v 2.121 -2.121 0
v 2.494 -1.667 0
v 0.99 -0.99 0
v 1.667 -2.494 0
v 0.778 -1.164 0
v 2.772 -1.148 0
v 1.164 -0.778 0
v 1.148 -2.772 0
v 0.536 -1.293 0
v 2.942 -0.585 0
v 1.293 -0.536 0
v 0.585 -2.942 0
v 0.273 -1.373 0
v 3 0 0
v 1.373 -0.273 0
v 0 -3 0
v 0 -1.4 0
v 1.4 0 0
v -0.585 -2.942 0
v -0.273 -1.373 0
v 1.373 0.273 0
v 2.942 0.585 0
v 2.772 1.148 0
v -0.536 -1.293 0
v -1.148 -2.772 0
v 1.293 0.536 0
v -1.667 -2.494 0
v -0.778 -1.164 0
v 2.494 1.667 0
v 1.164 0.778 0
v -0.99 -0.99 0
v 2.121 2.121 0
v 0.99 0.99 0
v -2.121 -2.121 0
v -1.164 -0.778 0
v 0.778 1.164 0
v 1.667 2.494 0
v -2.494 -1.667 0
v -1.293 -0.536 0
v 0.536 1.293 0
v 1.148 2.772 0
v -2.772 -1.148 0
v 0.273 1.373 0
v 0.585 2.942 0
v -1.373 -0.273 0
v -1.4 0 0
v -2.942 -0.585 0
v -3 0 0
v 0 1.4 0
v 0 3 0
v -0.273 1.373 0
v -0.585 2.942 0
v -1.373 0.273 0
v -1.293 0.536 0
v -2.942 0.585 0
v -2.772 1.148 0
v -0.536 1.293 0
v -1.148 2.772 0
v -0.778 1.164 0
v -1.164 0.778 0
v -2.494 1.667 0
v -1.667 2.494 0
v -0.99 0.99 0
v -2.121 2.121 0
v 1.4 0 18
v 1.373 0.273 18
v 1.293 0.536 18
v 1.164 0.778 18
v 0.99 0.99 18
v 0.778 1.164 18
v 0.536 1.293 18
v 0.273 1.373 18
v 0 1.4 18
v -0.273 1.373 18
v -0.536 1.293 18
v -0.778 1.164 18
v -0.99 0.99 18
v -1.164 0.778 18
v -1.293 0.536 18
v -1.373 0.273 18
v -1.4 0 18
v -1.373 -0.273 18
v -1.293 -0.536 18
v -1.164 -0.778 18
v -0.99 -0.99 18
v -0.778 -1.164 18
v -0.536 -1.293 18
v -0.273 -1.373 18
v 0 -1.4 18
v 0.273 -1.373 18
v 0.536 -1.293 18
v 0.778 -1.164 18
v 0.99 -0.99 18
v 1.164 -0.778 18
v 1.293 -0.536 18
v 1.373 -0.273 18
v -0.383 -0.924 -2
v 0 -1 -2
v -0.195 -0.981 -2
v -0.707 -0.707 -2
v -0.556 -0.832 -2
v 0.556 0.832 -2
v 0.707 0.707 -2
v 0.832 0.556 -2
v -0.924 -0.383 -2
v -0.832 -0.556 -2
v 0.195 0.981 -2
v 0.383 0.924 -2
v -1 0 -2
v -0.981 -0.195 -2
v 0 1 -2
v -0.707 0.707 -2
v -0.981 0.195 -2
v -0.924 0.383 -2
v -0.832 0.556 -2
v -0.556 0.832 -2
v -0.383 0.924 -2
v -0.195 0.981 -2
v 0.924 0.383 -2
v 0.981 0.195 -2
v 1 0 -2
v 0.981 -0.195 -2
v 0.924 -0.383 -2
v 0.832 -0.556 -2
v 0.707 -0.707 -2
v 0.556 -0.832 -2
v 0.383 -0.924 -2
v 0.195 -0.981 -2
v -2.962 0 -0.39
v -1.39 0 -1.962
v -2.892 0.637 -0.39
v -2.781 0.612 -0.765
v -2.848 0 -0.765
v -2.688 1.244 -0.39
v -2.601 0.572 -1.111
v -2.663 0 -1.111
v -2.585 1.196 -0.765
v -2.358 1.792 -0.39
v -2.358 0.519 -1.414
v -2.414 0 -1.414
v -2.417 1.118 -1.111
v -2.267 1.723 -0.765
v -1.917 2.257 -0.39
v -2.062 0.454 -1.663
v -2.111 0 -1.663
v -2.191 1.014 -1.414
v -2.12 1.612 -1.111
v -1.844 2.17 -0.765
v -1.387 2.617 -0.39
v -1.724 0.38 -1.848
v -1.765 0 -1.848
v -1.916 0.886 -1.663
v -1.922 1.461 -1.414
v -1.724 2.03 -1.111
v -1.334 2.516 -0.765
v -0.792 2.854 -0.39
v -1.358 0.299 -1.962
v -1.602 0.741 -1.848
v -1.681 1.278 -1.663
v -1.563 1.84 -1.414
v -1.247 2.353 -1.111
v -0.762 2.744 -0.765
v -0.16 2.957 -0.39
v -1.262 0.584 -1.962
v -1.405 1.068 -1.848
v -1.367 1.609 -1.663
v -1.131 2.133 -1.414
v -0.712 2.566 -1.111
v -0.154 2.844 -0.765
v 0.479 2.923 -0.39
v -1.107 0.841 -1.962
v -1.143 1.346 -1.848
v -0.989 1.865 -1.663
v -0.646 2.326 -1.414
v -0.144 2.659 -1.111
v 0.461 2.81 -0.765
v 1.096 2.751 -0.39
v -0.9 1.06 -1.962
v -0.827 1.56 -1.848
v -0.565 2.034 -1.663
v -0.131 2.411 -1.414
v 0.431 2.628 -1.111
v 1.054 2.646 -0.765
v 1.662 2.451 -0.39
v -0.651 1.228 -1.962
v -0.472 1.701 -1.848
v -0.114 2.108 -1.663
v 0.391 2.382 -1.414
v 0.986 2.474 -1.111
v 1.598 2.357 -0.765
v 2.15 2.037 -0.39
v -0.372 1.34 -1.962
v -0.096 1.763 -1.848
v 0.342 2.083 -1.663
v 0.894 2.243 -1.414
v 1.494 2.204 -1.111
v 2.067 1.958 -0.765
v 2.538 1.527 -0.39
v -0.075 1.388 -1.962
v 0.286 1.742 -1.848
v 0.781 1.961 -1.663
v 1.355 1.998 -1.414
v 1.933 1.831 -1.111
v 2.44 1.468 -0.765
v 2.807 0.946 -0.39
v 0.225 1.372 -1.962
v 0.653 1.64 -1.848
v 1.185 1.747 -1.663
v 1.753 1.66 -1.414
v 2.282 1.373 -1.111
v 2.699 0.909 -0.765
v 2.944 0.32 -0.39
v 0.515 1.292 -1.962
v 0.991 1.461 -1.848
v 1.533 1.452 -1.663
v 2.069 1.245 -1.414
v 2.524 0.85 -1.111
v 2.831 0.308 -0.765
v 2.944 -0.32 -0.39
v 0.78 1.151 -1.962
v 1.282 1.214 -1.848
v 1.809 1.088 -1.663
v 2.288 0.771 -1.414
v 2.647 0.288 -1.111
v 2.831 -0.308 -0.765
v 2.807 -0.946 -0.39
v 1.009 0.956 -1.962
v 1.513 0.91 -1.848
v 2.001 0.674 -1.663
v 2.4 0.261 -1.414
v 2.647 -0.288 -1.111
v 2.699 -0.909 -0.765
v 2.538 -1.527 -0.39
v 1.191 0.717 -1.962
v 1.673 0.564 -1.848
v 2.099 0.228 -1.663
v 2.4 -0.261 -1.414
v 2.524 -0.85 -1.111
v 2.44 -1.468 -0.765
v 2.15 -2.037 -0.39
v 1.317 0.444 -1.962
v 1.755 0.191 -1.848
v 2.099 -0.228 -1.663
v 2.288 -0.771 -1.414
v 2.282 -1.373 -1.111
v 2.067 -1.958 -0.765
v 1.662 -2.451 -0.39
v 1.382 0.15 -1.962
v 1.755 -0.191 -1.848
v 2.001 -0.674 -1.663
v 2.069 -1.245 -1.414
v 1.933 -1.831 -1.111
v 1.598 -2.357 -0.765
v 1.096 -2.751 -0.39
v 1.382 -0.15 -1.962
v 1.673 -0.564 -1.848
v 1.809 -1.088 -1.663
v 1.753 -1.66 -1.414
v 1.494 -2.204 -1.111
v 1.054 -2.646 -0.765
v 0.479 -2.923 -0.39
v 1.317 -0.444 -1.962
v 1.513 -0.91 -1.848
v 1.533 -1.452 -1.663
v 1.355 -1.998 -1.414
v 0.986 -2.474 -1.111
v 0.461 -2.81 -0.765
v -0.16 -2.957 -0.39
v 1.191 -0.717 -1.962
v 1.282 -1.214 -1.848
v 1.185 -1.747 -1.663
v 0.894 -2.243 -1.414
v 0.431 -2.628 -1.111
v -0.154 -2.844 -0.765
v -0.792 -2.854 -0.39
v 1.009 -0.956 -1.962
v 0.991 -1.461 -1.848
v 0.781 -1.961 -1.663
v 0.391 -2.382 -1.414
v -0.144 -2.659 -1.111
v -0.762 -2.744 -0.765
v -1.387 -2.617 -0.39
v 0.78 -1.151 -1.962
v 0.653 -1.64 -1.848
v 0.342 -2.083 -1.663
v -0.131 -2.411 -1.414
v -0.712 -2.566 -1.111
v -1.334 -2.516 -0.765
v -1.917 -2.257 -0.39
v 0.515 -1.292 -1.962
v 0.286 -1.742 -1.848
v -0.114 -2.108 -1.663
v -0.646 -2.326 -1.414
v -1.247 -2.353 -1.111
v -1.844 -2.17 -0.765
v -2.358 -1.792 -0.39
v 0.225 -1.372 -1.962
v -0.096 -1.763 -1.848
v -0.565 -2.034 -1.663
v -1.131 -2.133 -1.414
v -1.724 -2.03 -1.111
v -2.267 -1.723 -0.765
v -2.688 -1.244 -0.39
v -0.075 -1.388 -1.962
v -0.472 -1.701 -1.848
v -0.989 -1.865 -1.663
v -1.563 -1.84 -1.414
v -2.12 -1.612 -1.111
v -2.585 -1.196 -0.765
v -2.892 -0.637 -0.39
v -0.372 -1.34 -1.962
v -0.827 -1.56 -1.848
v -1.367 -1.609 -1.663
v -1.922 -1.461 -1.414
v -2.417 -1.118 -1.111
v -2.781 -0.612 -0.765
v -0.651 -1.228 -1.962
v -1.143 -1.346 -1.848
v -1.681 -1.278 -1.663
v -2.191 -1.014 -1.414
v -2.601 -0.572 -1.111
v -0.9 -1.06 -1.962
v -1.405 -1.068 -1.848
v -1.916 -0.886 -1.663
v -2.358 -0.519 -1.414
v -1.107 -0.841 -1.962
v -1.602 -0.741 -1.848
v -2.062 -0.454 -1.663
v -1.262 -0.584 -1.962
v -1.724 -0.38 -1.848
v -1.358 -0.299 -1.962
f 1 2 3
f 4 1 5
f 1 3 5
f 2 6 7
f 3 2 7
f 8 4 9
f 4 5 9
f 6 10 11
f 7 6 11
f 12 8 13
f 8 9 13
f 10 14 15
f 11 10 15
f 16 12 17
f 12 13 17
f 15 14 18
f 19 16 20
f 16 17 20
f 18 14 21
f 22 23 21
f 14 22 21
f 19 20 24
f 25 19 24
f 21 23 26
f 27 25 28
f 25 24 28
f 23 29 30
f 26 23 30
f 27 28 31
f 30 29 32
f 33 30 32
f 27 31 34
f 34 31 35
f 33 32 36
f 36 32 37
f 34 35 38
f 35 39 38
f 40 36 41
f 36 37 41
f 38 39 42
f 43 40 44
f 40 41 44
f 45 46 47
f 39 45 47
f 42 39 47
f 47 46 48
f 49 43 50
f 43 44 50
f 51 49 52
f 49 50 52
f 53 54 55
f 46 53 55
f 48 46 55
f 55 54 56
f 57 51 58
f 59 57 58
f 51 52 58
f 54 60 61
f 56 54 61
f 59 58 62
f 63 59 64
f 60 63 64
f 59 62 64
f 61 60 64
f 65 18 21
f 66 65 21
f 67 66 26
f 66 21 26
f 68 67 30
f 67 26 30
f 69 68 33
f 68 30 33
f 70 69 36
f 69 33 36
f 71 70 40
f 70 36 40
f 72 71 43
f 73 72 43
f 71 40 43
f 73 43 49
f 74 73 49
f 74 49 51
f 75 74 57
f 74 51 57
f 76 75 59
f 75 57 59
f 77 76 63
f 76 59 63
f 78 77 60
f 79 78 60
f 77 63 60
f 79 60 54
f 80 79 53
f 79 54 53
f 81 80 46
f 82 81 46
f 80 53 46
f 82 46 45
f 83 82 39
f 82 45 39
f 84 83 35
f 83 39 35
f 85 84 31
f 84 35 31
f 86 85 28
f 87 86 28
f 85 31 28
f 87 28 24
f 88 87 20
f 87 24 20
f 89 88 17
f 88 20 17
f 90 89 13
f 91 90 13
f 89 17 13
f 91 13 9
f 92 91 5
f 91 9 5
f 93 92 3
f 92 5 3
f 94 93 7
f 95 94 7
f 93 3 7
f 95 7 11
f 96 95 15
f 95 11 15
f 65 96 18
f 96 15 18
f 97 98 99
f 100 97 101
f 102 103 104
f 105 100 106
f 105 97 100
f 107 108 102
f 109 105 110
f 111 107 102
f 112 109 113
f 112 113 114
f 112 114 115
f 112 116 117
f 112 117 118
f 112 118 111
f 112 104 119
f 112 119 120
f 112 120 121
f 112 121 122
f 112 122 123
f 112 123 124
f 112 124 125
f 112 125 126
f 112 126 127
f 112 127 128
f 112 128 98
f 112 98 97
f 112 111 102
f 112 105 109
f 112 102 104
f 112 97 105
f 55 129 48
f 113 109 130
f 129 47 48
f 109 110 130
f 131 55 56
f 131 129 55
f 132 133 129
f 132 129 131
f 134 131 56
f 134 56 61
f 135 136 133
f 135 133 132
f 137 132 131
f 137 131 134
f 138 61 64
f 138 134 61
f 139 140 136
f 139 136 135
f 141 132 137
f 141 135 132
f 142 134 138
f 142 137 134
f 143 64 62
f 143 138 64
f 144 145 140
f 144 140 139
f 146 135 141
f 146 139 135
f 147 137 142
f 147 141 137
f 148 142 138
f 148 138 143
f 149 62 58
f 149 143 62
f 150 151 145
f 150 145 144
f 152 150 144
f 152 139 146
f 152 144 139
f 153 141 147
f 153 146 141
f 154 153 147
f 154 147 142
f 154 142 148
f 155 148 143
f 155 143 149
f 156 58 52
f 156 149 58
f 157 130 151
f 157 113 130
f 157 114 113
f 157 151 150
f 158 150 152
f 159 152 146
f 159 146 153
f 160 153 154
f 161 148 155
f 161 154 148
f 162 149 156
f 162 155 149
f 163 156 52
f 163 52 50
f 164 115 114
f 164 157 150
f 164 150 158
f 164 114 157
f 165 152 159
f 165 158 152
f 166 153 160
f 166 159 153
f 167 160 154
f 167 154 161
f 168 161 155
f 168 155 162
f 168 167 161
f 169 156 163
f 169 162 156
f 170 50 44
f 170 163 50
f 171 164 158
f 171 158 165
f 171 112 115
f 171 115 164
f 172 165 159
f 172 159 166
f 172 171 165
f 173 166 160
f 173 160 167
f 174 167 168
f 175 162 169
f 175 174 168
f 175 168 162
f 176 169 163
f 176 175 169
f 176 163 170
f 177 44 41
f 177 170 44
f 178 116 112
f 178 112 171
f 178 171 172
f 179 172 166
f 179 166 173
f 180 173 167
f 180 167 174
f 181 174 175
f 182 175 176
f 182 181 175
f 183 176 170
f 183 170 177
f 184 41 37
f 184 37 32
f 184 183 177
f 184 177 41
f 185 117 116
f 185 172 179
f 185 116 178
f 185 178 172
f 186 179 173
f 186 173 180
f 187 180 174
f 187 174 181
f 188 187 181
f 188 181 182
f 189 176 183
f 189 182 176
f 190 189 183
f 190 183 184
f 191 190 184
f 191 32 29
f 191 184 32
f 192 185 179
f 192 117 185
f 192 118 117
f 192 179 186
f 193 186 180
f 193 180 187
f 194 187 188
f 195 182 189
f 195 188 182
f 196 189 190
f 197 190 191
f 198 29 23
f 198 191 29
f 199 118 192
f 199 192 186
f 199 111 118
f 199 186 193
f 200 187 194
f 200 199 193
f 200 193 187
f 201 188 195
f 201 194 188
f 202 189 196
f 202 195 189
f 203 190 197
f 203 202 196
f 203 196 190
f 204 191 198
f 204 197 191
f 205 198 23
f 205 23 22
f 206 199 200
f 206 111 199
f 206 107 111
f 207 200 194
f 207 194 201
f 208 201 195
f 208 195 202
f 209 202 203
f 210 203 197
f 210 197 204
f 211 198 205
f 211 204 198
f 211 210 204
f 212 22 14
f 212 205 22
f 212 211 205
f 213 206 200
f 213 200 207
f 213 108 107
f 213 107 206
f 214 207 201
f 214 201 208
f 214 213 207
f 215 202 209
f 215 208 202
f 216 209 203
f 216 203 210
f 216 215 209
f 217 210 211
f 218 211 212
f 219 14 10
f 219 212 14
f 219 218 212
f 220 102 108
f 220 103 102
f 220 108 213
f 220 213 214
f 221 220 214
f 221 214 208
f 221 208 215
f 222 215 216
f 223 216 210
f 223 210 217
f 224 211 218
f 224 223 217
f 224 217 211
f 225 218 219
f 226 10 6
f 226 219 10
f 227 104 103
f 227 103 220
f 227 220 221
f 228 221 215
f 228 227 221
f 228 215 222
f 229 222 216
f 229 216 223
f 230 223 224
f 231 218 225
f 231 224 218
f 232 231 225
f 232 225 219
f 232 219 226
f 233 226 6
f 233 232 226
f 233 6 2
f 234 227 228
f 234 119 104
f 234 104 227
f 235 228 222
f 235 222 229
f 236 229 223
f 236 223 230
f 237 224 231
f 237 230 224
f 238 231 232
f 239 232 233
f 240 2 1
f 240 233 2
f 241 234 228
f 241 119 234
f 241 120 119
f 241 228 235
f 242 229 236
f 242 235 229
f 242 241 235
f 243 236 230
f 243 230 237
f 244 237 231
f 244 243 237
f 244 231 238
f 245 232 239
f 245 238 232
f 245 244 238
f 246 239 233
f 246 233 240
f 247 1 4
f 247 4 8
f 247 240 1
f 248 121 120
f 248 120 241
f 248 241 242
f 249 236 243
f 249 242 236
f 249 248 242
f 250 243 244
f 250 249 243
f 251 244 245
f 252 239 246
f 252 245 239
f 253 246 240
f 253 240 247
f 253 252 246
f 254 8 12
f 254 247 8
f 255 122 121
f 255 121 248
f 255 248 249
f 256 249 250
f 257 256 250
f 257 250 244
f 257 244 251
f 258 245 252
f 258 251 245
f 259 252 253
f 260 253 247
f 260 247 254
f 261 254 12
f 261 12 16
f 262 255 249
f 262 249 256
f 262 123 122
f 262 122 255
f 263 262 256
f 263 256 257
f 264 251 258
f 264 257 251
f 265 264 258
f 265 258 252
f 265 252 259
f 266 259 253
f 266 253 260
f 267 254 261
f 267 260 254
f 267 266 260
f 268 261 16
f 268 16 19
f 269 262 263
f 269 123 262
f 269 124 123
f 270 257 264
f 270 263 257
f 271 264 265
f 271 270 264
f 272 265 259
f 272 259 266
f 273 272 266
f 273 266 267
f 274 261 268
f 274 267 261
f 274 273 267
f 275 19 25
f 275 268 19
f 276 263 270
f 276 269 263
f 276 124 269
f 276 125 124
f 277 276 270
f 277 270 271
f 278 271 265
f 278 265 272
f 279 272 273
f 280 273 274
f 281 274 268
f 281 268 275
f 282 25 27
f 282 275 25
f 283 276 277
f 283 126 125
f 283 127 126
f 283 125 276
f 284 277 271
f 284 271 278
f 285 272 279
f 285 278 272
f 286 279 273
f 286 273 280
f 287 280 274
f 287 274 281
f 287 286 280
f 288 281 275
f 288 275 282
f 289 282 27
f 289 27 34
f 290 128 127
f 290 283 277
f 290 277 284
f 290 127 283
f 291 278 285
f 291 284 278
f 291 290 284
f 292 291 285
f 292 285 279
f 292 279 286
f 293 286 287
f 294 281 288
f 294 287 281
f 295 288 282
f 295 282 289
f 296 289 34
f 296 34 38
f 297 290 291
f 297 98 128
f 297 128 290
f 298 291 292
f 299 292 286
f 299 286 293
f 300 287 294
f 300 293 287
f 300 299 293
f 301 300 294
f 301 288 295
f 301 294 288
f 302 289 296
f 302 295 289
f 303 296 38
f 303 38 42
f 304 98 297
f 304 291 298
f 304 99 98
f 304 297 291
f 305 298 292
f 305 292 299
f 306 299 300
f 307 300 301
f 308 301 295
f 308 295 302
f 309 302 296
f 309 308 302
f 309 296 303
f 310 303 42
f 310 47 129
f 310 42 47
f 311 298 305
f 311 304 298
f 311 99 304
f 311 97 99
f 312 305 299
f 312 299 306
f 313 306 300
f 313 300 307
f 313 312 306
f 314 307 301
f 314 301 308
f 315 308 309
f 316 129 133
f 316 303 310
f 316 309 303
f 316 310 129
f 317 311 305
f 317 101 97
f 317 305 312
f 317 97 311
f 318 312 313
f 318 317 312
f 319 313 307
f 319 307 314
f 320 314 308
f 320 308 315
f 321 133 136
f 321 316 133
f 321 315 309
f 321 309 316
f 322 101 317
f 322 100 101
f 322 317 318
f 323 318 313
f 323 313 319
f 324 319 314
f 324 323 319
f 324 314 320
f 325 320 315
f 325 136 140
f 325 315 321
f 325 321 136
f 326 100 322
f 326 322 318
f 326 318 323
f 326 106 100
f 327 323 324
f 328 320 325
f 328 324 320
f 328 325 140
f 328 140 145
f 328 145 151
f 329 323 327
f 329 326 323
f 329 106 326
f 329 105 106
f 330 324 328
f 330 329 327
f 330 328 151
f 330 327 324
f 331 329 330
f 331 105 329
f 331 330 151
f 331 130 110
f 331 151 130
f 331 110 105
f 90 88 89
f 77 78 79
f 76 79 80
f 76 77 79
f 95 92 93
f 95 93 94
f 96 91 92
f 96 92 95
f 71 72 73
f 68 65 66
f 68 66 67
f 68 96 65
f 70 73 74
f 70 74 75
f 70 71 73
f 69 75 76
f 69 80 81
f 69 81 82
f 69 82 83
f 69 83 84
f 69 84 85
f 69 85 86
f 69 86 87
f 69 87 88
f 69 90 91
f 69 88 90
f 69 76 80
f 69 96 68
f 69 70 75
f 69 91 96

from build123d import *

# Parameters (mm, degrees)
ESQUISSE1_R        = 1.4
BOSS_EXTRU_1_DEPTH = 18
ESQUISSE2_R        = 3
BOSS_EXTRU_2_DEPTH = 2
CONG_2_R           = 2


with BuildPart() as part:
    # Esquisse1 → Boss.-Extru.1 (new body)
    with BuildSketch(Plane.XY):
        Circle(ESQUISSE1_R)
    extrude(amount=BOSS_EXTRU_1_DEPTH)

    # Esquisse2 → Boss.-Extru.2 (add)
    with BuildSketch(Plane(origin=(0, 0, 0), x_dir=(-1, 0, 0), z_dir=(0, 0, -1))):
        Circle(ESQUISSE2_R)
    extrude(amount=BOSS_EXTRU_2_DEPTH)

    # Congé2
    cong_2_edges = [part.edges().sort_by_distance(p)[0] for p in [
        (3, 0, -2),
    ]]
    fillet(cong_2_edges, radius=CONG_2_R - 0.0001)  # a hair under: the kernel refuses the full size


solid = part.part
